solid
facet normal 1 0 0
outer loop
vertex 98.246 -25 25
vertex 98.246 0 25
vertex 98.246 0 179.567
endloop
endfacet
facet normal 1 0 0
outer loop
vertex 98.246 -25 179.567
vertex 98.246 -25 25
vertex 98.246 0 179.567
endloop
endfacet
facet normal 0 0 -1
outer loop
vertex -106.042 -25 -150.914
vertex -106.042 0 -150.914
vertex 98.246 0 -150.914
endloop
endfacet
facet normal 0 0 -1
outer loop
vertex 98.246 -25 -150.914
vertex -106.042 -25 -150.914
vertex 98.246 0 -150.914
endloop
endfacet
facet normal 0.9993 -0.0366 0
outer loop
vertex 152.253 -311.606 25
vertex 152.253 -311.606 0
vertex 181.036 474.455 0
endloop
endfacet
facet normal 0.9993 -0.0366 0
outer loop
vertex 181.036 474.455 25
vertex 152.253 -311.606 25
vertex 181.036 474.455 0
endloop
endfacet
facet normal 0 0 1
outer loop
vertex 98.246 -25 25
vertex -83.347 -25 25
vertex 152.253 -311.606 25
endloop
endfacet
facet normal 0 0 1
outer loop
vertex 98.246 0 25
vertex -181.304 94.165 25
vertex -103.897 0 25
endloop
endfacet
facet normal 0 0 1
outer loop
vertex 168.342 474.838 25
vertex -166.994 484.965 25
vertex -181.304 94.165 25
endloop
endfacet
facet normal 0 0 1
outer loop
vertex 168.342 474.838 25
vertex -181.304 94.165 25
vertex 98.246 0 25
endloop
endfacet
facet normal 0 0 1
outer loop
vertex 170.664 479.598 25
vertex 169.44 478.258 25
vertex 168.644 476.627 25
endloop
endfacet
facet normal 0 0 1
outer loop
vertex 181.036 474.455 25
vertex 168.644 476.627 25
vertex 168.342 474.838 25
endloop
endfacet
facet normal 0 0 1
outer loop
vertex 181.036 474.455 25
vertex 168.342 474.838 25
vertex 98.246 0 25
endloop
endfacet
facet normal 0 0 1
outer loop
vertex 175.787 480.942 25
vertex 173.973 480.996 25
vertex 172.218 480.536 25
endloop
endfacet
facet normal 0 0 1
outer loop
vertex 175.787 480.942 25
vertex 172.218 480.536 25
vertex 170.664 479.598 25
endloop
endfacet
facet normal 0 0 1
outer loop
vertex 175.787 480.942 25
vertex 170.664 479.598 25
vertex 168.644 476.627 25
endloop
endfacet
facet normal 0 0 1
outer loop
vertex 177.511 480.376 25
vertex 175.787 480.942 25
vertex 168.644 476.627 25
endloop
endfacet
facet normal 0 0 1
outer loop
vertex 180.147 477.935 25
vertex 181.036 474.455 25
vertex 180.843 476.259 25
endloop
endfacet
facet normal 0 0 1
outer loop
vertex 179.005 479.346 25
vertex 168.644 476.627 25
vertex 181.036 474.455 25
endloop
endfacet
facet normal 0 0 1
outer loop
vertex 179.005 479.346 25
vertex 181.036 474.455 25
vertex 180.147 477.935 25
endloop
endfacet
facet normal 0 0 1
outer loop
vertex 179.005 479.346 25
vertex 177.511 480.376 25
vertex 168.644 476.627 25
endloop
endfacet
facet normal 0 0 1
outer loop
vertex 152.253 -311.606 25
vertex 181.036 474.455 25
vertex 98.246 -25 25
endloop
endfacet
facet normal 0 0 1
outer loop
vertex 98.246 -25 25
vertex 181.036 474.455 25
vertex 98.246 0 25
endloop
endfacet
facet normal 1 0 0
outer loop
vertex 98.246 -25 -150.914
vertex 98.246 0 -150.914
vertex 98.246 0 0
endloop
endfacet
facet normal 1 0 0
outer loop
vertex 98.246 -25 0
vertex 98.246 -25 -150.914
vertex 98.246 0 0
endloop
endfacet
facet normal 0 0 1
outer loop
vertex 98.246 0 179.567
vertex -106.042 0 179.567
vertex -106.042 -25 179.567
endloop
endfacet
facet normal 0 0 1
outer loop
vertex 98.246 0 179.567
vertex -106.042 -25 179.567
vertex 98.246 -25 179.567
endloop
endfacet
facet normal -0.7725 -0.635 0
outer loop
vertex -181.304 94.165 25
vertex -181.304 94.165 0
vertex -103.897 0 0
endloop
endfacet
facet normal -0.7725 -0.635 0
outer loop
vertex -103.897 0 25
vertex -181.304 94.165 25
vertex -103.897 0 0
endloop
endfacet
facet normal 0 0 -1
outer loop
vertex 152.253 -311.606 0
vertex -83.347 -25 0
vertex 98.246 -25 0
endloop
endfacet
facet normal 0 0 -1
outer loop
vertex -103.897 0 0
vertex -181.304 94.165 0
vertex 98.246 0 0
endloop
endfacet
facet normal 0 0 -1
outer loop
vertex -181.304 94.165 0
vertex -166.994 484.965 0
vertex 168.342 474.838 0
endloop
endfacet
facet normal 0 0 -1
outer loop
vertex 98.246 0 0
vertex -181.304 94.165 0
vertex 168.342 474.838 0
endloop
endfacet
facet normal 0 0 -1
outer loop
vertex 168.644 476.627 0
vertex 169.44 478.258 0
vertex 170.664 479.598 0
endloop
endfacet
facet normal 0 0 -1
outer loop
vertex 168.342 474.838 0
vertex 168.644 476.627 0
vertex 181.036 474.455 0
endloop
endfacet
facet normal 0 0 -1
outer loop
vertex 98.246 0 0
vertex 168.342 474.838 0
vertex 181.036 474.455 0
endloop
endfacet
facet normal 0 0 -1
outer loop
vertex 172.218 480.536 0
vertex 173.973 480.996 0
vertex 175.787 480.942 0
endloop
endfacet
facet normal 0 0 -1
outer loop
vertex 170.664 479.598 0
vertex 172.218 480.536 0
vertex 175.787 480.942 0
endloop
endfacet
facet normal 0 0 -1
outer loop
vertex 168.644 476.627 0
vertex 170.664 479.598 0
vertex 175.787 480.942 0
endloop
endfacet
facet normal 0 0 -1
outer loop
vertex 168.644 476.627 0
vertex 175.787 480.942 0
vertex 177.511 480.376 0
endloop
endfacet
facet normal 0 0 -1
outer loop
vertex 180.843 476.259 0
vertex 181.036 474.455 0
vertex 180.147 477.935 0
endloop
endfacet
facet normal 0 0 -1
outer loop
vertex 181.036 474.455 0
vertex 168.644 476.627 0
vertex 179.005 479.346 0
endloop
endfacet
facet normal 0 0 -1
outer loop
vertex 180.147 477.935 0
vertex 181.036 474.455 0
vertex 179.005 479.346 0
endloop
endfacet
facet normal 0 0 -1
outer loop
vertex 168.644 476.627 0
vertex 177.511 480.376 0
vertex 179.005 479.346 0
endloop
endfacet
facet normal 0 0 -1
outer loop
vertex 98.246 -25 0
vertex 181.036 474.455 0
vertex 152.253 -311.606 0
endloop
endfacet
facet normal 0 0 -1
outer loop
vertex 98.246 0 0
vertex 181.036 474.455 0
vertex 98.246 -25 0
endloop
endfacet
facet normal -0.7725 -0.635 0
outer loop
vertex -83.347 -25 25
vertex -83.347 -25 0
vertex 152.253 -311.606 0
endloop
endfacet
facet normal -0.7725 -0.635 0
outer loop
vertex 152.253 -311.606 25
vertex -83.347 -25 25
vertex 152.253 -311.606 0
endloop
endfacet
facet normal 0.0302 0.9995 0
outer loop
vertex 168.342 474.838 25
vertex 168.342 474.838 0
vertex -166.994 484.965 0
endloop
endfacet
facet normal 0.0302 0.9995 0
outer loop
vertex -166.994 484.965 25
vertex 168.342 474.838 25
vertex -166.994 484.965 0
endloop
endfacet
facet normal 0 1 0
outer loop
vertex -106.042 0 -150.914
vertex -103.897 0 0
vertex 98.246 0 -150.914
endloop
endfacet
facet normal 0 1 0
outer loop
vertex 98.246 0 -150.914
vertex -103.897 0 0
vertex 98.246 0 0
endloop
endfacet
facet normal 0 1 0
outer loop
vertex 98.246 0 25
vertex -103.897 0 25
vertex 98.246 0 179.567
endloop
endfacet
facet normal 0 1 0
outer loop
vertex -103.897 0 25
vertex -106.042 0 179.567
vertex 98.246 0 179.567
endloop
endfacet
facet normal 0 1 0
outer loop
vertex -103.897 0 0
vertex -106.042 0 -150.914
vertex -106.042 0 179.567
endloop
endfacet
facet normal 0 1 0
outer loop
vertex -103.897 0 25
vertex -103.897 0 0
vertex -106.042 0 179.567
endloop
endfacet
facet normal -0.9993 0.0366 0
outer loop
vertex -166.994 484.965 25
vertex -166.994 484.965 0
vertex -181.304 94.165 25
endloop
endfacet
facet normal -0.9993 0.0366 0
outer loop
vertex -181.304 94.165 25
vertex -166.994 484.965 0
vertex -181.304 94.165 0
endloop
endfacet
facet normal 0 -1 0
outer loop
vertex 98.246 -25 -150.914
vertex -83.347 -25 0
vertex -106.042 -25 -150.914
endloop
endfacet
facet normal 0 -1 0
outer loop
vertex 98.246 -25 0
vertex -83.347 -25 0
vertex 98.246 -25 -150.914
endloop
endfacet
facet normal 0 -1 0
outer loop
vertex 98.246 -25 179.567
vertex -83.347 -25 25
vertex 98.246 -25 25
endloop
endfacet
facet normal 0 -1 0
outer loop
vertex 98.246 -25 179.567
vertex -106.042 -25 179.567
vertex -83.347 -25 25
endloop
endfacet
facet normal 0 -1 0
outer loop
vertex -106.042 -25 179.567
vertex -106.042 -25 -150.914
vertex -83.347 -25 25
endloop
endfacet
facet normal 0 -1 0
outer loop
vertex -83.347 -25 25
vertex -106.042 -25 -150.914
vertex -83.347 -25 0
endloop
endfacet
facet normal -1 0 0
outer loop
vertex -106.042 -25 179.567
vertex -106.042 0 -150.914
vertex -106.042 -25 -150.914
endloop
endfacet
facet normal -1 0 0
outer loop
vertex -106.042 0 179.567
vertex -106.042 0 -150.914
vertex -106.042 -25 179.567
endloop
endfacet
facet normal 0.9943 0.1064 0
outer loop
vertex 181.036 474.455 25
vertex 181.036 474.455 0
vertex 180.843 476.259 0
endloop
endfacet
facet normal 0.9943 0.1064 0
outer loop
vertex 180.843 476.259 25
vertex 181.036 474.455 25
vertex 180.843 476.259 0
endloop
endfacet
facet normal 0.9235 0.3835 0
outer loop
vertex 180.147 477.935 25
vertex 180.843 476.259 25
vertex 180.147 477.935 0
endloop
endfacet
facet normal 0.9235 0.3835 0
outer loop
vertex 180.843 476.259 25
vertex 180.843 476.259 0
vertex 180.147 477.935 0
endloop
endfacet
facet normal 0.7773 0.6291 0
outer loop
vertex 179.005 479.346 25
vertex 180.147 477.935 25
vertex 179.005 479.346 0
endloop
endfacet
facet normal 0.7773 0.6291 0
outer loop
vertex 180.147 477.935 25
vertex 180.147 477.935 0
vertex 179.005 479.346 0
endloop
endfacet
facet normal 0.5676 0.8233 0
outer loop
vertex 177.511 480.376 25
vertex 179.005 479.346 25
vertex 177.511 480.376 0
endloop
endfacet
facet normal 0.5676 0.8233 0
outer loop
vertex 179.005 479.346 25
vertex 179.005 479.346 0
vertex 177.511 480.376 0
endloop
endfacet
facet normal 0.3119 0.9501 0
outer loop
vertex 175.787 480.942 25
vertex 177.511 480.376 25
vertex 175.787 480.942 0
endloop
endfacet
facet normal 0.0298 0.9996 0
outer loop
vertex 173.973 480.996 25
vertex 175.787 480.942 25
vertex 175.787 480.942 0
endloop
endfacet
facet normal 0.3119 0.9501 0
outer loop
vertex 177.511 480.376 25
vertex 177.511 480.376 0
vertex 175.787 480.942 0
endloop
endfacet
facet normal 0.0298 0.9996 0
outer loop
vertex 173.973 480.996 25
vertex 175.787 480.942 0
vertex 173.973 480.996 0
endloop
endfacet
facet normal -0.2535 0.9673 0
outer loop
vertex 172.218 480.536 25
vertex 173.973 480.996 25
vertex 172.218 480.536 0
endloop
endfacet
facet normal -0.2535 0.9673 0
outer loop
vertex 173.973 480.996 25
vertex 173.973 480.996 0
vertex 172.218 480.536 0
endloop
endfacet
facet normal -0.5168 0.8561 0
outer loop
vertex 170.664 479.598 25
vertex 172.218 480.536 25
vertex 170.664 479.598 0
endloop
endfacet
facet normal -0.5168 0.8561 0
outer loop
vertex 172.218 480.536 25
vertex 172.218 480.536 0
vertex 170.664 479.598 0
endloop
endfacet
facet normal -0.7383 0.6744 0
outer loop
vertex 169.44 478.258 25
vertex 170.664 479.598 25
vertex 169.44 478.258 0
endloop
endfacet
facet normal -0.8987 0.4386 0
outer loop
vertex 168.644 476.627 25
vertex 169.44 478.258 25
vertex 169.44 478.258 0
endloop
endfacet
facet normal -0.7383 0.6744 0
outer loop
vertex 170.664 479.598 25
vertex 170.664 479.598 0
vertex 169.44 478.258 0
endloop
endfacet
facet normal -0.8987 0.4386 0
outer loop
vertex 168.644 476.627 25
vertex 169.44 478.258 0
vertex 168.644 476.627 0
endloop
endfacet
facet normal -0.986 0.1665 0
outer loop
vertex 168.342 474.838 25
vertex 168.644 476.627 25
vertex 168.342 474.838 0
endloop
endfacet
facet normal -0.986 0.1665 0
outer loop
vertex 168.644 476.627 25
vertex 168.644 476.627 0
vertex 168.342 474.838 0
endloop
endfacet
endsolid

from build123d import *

# Parameters (mm, degrees)
F2_DEPTH = 25
F3_W     = 204.2875885963
F3_H     = 330.4814696312
F4_DEPTH = 25


with BuildPart() as f2:
    # F1 (on Top) → F2 (new body)
    with BuildSketch(Plane.XY):
        with BuildLine():
            Line((168.3422140292, 474.8379558081), (181.0361660289, 474.454610266))
            ThreePointArc((181.0361660289, 474.454610266), (174.8820955467, 481.0340797179), (168.3422140292, 474.8379558081))
        make_face()
        with BuildLine():
            Line((166.6445245232, 81.42426457), (181.0361660289, 474.454610266))
            Line((181.0361660289, 474.454610266), (168.3422140292, 474.8379558081))
            Line((168.3422140292, 474.8379558081), (-166.9943213011, 484.9648072356))
            Line((-166.9943213011, 484.9648072356), (-178.021518384, 183.8161801091))
            add(Edge.make_bspline(
                [(-178.021518384, 183.8161801091), (-126.121723234, 189.1373544028), (-5.2720297028, 157.9893070947), (124.2923755779, 80.293310388), (162.9702843725, 49.4019598786)],
                knots=[504.1665264406, 504.1665264406, 504.1665264406, 504.1665264406, 653.3978700476, 795.436226982, 795.436226982, 795.436226982, 795.436226982], degree=3))
            add(Edge.make_bspline(
                [(162.9702843725, 49.4019598786), (163.7914086642, 48.7461426667), (164.6014886785, 48.0934791624), (165.4002701181, 47.4441422338)],
                knots=[795.436226982, 795.436226982, 795.436226982, 795.436226982, 798.4516729787, 798.4516729787, 798.4516729787, 798.4516729787], degree=3))
            Line((165.4002701181, 47.4441422338), (166.6445245232, 81.42426457))
        make_face()
        with BuildLine():
            Line((163.474066231, -5.1597653413), (165.4002701181, 47.4441422338))
            add(Edge.make_bspline(
                [(162.9702843725, 49.4019598786), (163.7914086642, 48.7461426667), (164.6014886785, 48.0934791624), (165.4002701181, 47.4441422338)],
                knots=[795.436226982, 795.436226982, 795.436226982, 795.436226982, 798.4516729787, 798.4516729787, 798.4516729787, 798.4516729787], degree=3))
            Line((162.9702843725, 49.4019598786), (160.9759493271, -5.0625841432))
            add(Edge.make_bspline(
                [(163.474066231, -5.1597653413), (162.6521846932, -5.131062894), (161.8193790258, -5.0986033684), (160.9759493271, -5.0625841432)],
                knots=[958.9382746439, 958.9382746439, 958.9382746439, 958.9382746439, 961.7589781967, 961.7589781967, 961.7589781967, 961.7589781967], degree=3))
        make_face()
        with BuildLine():
            Line((160.9759493271, -5.0625841432), (162.9702843725, 49.4019598786))
            add(Edge.make_bspline(
                [(-178.021518384, 183.8161801091), (-126.121723234, 189.1373544028), (-5.2720297028, 157.9893070947), (124.2923755779, 80.293310388), (162.9702843725, 49.4019598786)],
                knots=[504.1665264406, 504.1665264406, 504.1665264406, 504.1665264406, 653.3978700476, 795.436226982, 795.436226982, 795.436226982, 795.436226982], degree=3))
            Line((-178.021518384, 183.8161801091), (-181.3042814193, 94.1651496755))
            Line((-181.3042814193, 94.1651496755), (-88.1747823589, -19.1265900522))
            add(Edge.make_bspline(
                [(160.9759493271, -5.0625841432), (121.4037743321, -3.3726281412), (19.2880670567, 12.0779258477), (-62.8138782039, -5.4855367148), (-88.1747823589, -19.1265900522)],
                knots=[961.7589781967, 961.7589781967, 961.7589781967, 961.7589781967, 1094.1012170077, 1176.4100957539, 1176.4100957539, 1176.4100957539, 1176.4100957539], degree=3))
        make_face()
        with BuildLine():
            Line((159.4487037703, -115.0909082779), (163.474066231, -5.1597653413))
            add(Edge.make_bspline(
                [(163.474066231, -5.1597653413), (162.6521846932, -5.131062894), (161.8193790258, -5.0986033684), (160.9759493271, -5.0625841432)],
                knots=[958.9382746439, 958.9382746439, 958.9382746439, 958.9382746439, 961.7589781967, 961.7589781967, 961.7589781967, 961.7589781967], degree=3))
            add(Edge.make_bspline(
                [(160.9759493271, -5.0625841432), (121.4037743321, -3.3726281412), (19.2880670567, 12.0779258477), (-62.8138782039, -5.4855367148), (-88.1747823589, -19.1265900522)],
                knots=[961.7589781967, 961.7589781967, 961.7589781967, 961.7589781967, 1094.1012170077, 1176.4100957539, 1176.4100957539, 1176.4100957539, 1176.4100957539], degree=3))
            Line((-88.1747823589, -19.1265900522), (152.2528830175, -311.6060811259))
            Line((152.2528830175, -311.6060811259), (155.8507933939, -213.3484947019))
            Line((155.8507933939, -213.3484947019), (159.4487037703, -115.0909082779))
        make_face()
    extrude(amount=F2_DEPTH)

    # F3 (on face) → F4 (join)
    with BuildSketch(Plane.XZ):
        with Locations((-3.8982927799, 14.3264830112)):
            Rectangle(F3_W, F3_H)
    extrude(amount=F4_DEPTH)


solid = f2.part
